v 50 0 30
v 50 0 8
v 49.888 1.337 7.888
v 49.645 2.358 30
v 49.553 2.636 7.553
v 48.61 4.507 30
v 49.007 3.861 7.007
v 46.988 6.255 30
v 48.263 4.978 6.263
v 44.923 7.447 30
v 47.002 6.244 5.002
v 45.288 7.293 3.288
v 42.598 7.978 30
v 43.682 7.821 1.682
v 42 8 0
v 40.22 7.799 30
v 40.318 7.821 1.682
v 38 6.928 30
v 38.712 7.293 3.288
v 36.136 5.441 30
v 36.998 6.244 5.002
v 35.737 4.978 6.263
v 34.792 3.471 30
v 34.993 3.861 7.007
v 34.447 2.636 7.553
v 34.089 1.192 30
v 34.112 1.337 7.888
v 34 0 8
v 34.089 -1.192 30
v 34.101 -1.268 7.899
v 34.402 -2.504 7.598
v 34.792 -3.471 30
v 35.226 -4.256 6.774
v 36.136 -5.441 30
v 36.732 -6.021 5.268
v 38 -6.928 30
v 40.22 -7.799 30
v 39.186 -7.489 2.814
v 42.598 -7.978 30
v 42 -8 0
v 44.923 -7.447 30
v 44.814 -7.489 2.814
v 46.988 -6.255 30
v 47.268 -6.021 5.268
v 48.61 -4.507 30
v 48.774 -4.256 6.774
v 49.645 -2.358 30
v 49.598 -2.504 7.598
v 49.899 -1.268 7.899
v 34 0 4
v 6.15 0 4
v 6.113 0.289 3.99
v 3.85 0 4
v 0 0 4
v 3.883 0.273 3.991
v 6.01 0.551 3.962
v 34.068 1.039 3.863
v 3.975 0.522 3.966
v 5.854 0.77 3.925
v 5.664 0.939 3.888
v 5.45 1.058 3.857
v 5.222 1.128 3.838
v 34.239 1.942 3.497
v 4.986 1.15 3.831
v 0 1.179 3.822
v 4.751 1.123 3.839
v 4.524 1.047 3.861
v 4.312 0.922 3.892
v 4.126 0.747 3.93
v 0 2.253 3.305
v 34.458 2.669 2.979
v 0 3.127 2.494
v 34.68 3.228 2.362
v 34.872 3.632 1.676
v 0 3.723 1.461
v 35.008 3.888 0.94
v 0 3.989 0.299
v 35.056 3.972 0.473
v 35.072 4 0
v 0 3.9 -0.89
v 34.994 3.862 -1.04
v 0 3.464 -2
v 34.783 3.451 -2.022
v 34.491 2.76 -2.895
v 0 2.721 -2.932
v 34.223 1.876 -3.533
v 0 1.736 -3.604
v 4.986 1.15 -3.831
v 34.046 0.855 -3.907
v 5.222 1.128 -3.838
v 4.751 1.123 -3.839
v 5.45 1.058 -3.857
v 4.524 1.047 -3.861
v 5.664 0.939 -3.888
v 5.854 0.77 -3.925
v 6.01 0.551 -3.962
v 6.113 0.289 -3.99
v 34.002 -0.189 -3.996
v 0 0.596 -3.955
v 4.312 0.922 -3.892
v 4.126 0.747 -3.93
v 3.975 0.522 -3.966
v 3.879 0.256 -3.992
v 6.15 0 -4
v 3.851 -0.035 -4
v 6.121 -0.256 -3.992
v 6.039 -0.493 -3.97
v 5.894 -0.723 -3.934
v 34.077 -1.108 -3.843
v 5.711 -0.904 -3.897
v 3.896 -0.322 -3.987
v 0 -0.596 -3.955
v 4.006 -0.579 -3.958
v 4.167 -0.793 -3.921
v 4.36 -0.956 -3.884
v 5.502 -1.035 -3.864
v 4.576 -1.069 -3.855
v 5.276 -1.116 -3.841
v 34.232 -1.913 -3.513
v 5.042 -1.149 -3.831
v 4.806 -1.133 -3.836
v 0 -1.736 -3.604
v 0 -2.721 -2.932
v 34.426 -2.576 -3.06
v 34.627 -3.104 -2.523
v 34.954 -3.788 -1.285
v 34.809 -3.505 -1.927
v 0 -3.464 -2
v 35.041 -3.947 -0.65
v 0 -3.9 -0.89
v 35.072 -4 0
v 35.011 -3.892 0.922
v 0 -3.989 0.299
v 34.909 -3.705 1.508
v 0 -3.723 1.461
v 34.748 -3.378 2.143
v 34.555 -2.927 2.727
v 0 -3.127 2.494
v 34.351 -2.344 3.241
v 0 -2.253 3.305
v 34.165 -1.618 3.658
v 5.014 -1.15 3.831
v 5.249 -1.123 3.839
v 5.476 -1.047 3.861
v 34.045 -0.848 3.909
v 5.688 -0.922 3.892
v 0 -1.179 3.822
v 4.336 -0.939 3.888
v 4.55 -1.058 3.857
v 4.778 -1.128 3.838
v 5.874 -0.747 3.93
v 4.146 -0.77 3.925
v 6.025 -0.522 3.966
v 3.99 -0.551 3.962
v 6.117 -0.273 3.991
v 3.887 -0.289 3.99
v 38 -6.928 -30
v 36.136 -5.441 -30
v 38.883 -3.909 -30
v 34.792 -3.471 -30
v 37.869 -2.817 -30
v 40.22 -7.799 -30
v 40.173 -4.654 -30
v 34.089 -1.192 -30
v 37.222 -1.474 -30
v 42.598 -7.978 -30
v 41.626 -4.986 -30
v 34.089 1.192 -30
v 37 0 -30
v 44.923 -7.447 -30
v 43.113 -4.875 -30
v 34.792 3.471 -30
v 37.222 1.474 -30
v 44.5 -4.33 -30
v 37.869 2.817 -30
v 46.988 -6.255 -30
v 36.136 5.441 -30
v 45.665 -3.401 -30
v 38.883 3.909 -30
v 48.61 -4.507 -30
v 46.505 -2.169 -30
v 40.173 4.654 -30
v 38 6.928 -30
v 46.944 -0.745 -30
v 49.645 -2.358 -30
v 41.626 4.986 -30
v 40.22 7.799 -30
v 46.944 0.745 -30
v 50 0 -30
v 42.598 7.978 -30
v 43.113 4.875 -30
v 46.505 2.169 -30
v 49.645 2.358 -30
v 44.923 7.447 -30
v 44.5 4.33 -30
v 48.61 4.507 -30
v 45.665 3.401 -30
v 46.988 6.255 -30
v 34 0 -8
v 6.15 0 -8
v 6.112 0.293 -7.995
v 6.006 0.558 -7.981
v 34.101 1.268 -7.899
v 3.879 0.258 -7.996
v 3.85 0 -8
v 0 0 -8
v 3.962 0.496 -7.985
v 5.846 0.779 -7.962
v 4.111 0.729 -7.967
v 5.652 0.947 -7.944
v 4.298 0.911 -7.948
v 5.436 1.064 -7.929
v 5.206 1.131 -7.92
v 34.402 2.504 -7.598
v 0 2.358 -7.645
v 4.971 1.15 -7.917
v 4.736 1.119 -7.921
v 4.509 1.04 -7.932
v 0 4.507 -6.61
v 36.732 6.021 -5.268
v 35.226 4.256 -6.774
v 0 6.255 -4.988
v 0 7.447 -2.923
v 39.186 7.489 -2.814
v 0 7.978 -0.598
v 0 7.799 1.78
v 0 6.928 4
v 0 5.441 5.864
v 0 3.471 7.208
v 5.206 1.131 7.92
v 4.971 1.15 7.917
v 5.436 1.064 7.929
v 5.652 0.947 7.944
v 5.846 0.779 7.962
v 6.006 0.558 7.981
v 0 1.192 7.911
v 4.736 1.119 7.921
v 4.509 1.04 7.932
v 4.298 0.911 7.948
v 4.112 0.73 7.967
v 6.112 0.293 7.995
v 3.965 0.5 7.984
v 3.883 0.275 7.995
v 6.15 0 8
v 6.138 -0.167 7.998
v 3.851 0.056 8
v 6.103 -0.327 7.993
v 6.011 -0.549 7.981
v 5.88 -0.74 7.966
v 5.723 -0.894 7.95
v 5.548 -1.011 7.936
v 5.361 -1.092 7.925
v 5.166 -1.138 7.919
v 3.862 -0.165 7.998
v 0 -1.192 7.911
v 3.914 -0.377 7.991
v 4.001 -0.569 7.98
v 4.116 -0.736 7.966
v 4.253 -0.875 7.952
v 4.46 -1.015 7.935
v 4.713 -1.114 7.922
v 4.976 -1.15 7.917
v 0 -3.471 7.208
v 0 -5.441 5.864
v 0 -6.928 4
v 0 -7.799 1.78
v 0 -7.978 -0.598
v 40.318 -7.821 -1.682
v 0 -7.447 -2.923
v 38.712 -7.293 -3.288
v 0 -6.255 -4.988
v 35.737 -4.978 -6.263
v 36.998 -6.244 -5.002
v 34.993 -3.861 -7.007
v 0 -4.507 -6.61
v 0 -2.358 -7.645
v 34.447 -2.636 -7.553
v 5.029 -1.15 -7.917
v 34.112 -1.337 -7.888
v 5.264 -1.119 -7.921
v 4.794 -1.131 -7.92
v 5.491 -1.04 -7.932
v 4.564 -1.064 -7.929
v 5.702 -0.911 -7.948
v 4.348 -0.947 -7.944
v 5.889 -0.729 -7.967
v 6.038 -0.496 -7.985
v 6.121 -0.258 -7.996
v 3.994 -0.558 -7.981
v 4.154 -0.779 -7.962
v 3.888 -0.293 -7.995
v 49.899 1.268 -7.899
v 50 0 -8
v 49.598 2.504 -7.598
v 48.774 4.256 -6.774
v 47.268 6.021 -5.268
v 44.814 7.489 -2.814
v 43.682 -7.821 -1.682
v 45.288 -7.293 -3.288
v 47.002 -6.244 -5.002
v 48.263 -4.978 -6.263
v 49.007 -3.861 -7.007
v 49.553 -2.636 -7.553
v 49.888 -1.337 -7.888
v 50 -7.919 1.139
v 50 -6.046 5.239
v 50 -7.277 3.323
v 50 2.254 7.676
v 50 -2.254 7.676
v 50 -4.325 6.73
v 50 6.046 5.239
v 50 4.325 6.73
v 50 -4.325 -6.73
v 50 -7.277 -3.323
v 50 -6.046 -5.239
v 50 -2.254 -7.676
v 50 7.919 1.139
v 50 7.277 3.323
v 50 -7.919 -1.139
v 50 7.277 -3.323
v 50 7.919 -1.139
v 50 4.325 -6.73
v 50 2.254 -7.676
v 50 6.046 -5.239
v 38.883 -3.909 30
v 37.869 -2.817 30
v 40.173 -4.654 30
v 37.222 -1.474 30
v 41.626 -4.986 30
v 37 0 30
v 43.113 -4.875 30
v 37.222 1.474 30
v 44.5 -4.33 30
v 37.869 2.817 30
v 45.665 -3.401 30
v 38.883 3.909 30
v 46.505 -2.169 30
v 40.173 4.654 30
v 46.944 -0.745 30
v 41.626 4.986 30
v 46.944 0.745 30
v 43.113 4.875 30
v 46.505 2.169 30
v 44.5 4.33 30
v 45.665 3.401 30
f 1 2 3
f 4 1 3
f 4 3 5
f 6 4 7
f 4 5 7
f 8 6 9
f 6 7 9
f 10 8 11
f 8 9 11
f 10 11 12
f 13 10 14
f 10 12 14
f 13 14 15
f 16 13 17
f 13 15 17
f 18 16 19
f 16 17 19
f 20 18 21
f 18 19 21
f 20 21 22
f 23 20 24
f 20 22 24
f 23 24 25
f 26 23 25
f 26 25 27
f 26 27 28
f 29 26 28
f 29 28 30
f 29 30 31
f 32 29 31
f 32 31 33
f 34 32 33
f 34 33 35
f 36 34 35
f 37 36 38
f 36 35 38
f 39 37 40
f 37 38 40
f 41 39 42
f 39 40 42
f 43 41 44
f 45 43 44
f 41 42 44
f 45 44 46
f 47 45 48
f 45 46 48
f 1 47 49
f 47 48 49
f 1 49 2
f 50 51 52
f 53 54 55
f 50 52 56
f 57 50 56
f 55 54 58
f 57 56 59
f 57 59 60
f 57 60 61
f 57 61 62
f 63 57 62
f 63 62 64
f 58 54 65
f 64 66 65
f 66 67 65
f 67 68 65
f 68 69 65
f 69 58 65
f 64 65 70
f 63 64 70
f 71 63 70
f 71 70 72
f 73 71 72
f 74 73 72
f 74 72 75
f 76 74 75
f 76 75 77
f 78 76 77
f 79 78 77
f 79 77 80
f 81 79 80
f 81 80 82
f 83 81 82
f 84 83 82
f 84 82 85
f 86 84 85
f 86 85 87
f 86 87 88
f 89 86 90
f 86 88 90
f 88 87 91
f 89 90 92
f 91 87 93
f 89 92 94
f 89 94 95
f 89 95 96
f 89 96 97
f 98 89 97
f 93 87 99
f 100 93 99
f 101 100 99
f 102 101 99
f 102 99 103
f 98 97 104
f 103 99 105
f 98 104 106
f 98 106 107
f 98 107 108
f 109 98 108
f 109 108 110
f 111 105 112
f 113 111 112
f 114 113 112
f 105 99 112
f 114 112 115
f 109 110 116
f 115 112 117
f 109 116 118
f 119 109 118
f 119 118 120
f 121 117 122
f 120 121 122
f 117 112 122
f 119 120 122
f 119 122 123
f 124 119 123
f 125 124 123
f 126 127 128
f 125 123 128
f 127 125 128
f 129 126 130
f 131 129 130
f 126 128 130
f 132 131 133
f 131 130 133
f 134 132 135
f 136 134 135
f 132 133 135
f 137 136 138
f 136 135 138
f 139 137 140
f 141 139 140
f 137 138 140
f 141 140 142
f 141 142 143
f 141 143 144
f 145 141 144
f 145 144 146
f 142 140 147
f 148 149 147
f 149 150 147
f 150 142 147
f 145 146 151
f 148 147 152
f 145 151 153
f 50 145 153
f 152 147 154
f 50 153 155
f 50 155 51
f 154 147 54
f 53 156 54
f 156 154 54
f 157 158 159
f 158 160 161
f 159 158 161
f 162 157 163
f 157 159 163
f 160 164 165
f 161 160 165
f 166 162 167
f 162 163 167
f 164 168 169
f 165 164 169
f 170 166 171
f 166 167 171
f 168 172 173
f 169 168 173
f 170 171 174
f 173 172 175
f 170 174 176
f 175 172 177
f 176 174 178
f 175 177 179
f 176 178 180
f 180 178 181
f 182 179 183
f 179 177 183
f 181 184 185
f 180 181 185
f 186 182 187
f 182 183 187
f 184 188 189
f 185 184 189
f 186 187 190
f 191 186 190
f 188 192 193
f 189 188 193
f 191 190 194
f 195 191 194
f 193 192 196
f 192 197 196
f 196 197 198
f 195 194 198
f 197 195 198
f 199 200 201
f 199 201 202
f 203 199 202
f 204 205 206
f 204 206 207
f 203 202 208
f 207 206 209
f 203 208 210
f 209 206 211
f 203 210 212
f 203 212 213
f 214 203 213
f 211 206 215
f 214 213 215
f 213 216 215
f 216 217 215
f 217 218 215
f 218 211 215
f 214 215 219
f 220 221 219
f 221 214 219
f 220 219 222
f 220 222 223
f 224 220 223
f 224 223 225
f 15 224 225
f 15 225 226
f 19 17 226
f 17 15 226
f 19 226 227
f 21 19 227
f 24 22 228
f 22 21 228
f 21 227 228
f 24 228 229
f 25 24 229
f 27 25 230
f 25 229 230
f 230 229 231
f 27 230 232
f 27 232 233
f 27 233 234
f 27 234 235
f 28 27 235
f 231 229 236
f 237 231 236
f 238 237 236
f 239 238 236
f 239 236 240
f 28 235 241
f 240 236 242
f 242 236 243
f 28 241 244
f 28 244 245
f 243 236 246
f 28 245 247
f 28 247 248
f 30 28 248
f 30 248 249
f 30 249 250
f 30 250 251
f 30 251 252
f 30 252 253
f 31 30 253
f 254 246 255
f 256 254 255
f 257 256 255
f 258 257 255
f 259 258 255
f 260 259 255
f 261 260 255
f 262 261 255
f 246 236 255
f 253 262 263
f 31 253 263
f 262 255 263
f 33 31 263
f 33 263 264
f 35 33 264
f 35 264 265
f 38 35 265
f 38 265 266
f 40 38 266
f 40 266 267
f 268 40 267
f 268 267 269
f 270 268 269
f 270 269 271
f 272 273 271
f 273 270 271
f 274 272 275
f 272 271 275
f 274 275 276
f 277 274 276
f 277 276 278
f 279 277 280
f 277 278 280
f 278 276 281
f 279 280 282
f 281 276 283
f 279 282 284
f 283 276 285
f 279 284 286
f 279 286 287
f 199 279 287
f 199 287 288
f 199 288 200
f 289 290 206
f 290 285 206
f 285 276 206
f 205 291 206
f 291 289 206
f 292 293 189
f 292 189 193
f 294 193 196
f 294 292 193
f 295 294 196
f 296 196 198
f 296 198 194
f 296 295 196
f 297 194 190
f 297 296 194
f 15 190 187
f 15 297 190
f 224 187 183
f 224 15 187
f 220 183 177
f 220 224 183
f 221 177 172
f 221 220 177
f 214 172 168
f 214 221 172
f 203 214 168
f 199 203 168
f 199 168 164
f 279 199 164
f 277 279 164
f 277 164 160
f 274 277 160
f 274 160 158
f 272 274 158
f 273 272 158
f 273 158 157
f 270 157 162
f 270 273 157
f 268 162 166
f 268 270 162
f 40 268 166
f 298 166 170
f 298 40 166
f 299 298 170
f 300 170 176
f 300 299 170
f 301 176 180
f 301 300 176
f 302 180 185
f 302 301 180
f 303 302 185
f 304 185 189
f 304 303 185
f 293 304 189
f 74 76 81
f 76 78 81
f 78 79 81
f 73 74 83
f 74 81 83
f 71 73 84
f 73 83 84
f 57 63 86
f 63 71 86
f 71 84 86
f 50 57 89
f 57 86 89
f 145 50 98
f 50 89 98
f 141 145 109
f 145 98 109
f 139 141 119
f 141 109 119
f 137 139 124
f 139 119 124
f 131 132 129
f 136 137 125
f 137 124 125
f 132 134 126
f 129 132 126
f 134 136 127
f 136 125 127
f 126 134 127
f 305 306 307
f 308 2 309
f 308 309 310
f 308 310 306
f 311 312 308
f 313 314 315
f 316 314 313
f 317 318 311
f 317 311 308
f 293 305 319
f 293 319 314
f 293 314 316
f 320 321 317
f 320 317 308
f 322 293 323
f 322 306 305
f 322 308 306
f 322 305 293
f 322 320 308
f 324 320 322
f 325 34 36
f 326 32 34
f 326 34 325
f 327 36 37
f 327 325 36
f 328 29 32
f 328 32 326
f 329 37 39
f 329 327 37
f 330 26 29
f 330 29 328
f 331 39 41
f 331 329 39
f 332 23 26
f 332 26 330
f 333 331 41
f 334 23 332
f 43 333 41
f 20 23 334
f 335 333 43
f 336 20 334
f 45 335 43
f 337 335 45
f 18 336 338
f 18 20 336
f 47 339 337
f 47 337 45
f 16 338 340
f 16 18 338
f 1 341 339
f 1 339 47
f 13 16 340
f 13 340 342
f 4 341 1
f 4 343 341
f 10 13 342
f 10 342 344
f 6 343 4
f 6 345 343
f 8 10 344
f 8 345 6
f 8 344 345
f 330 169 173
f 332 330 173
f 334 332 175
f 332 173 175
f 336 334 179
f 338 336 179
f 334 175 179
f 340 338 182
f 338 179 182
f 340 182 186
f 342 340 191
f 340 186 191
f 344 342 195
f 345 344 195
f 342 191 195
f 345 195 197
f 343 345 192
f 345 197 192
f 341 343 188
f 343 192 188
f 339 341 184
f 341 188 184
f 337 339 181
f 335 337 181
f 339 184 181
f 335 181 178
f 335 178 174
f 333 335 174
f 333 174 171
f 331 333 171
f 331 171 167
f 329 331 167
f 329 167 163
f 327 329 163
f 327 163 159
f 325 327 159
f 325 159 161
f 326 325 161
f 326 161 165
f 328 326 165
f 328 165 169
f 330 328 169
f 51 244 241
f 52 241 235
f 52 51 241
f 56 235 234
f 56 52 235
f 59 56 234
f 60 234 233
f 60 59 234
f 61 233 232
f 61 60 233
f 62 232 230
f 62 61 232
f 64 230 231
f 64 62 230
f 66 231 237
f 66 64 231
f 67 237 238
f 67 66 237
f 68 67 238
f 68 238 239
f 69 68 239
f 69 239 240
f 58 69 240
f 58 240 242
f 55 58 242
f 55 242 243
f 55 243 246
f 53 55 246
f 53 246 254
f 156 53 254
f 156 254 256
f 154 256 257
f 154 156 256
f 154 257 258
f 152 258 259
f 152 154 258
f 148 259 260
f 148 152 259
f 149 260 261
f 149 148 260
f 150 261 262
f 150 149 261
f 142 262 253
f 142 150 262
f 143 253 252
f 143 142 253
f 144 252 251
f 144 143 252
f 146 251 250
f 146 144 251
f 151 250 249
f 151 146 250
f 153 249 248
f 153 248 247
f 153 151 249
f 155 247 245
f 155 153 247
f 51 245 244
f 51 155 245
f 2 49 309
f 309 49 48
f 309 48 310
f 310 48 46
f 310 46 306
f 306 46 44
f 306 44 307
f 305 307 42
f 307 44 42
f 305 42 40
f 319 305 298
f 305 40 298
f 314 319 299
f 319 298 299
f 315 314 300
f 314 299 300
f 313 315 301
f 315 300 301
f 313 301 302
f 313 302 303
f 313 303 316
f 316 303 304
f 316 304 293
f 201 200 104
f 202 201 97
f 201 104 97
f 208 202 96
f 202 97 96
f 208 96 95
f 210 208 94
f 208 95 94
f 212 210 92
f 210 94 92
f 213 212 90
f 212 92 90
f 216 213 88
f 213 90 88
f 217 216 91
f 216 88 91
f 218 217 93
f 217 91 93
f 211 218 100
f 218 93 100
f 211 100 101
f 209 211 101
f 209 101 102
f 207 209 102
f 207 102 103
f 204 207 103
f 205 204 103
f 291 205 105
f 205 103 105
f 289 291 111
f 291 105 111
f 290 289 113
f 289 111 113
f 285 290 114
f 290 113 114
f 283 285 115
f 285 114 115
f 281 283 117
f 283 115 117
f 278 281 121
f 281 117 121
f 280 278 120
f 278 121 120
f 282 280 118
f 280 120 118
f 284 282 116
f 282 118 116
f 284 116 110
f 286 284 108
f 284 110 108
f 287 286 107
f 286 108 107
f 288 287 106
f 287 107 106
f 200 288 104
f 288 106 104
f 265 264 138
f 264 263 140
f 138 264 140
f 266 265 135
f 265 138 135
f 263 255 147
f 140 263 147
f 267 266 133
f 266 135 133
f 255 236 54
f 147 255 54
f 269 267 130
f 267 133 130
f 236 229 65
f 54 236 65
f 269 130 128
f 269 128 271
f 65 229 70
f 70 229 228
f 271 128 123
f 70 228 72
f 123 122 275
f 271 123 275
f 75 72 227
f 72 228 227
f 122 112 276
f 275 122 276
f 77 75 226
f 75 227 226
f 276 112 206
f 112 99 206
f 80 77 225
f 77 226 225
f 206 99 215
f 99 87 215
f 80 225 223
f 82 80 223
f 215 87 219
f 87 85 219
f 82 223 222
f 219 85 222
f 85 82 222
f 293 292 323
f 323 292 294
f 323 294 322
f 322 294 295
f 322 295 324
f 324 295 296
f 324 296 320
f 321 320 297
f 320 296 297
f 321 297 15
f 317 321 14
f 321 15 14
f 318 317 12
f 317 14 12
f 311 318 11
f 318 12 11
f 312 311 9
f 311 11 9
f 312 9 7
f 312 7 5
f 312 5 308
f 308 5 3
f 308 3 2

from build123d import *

# Parameters (mm, degrees)
SKETCH_2_R               = 8
EXTRUDE_1_DEPTH          = 50
SKETCH_3_R               = 4
CUT_EXTRUDE_1_DEPTH      = 40
SKETCH_4_R               = 1.15
CUT_EXTRUDE_2_DEPTH      = 9
CUT_EXTRUDE_2_DEPTH_BACK = 9
SKETCH_5_R               = 8
EXTRUDE_2_DEPTH          = 30
EXTRUDE_2_DEPTH_BACK     = 30
SKETCH_6_R               = 5
CUT_EXTRUDE_4_DEPTH      = 61


with BuildPart() as part:
    # 草图2 → 凸台-拉伸1 (new body)
    with BuildSketch(Plane(origin=(0, 0, 0), x_dir=(0, 0, -1), z_dir=(1, 0, 0))):
        Circle(SKETCH_2_R)
    extrude(amount=EXTRUDE_1_DEPTH)

    # 草图3 → 切除-拉伸1 (cut)
    with BuildSketch(Plane.ZY):
        Circle(SKETCH_3_R)
    extrude(amount=-CUT_EXTRUDE_1_DEPTH, mode=Mode.SUBTRACT)

    # 草图4 → 切除-拉伸2 (cut, two sides)
    with BuildSketch(Plane.XY) as cut_extrude_2_sk:
        with Locations((5, 0)):
            Circle(SKETCH_4_R)
    extrude(amount=CUT_EXTRUDE_2_DEPTH, mode=Mode.SUBTRACT)
    extrude(cut_extrude_2_sk.sketch, amount=-CUT_EXTRUDE_2_DEPTH_BACK, mode=Mode.SUBTRACT)

    # 草图5 → 凸台-拉伸2 (add, two sides)
    with BuildSketch(Plane.XY) as extrude_2_sk:
        with Locations((42, 0)):
            Circle(SKETCH_5_R)
    extrude(amount=EXTRUDE_2_DEPTH)
    extrude(extrude_2_sk.sketch, amount=-EXTRUDE_2_DEPTH_BACK)

    # 草图6 → 切除-拉伸4 (cut, through all)
    with BuildSketch(Plane(origin=(0, 0, -30), x_dir=(-1, 0, 0), z_dir=(0, 0, -1))):
        with Locations((-42, 0)):
            Circle(SKETCH_6_R)
    extrude(amount=-CUT_EXTRUDE_4_DEPTH, mode=Mode.SUBTRACT)


solid = part.part
